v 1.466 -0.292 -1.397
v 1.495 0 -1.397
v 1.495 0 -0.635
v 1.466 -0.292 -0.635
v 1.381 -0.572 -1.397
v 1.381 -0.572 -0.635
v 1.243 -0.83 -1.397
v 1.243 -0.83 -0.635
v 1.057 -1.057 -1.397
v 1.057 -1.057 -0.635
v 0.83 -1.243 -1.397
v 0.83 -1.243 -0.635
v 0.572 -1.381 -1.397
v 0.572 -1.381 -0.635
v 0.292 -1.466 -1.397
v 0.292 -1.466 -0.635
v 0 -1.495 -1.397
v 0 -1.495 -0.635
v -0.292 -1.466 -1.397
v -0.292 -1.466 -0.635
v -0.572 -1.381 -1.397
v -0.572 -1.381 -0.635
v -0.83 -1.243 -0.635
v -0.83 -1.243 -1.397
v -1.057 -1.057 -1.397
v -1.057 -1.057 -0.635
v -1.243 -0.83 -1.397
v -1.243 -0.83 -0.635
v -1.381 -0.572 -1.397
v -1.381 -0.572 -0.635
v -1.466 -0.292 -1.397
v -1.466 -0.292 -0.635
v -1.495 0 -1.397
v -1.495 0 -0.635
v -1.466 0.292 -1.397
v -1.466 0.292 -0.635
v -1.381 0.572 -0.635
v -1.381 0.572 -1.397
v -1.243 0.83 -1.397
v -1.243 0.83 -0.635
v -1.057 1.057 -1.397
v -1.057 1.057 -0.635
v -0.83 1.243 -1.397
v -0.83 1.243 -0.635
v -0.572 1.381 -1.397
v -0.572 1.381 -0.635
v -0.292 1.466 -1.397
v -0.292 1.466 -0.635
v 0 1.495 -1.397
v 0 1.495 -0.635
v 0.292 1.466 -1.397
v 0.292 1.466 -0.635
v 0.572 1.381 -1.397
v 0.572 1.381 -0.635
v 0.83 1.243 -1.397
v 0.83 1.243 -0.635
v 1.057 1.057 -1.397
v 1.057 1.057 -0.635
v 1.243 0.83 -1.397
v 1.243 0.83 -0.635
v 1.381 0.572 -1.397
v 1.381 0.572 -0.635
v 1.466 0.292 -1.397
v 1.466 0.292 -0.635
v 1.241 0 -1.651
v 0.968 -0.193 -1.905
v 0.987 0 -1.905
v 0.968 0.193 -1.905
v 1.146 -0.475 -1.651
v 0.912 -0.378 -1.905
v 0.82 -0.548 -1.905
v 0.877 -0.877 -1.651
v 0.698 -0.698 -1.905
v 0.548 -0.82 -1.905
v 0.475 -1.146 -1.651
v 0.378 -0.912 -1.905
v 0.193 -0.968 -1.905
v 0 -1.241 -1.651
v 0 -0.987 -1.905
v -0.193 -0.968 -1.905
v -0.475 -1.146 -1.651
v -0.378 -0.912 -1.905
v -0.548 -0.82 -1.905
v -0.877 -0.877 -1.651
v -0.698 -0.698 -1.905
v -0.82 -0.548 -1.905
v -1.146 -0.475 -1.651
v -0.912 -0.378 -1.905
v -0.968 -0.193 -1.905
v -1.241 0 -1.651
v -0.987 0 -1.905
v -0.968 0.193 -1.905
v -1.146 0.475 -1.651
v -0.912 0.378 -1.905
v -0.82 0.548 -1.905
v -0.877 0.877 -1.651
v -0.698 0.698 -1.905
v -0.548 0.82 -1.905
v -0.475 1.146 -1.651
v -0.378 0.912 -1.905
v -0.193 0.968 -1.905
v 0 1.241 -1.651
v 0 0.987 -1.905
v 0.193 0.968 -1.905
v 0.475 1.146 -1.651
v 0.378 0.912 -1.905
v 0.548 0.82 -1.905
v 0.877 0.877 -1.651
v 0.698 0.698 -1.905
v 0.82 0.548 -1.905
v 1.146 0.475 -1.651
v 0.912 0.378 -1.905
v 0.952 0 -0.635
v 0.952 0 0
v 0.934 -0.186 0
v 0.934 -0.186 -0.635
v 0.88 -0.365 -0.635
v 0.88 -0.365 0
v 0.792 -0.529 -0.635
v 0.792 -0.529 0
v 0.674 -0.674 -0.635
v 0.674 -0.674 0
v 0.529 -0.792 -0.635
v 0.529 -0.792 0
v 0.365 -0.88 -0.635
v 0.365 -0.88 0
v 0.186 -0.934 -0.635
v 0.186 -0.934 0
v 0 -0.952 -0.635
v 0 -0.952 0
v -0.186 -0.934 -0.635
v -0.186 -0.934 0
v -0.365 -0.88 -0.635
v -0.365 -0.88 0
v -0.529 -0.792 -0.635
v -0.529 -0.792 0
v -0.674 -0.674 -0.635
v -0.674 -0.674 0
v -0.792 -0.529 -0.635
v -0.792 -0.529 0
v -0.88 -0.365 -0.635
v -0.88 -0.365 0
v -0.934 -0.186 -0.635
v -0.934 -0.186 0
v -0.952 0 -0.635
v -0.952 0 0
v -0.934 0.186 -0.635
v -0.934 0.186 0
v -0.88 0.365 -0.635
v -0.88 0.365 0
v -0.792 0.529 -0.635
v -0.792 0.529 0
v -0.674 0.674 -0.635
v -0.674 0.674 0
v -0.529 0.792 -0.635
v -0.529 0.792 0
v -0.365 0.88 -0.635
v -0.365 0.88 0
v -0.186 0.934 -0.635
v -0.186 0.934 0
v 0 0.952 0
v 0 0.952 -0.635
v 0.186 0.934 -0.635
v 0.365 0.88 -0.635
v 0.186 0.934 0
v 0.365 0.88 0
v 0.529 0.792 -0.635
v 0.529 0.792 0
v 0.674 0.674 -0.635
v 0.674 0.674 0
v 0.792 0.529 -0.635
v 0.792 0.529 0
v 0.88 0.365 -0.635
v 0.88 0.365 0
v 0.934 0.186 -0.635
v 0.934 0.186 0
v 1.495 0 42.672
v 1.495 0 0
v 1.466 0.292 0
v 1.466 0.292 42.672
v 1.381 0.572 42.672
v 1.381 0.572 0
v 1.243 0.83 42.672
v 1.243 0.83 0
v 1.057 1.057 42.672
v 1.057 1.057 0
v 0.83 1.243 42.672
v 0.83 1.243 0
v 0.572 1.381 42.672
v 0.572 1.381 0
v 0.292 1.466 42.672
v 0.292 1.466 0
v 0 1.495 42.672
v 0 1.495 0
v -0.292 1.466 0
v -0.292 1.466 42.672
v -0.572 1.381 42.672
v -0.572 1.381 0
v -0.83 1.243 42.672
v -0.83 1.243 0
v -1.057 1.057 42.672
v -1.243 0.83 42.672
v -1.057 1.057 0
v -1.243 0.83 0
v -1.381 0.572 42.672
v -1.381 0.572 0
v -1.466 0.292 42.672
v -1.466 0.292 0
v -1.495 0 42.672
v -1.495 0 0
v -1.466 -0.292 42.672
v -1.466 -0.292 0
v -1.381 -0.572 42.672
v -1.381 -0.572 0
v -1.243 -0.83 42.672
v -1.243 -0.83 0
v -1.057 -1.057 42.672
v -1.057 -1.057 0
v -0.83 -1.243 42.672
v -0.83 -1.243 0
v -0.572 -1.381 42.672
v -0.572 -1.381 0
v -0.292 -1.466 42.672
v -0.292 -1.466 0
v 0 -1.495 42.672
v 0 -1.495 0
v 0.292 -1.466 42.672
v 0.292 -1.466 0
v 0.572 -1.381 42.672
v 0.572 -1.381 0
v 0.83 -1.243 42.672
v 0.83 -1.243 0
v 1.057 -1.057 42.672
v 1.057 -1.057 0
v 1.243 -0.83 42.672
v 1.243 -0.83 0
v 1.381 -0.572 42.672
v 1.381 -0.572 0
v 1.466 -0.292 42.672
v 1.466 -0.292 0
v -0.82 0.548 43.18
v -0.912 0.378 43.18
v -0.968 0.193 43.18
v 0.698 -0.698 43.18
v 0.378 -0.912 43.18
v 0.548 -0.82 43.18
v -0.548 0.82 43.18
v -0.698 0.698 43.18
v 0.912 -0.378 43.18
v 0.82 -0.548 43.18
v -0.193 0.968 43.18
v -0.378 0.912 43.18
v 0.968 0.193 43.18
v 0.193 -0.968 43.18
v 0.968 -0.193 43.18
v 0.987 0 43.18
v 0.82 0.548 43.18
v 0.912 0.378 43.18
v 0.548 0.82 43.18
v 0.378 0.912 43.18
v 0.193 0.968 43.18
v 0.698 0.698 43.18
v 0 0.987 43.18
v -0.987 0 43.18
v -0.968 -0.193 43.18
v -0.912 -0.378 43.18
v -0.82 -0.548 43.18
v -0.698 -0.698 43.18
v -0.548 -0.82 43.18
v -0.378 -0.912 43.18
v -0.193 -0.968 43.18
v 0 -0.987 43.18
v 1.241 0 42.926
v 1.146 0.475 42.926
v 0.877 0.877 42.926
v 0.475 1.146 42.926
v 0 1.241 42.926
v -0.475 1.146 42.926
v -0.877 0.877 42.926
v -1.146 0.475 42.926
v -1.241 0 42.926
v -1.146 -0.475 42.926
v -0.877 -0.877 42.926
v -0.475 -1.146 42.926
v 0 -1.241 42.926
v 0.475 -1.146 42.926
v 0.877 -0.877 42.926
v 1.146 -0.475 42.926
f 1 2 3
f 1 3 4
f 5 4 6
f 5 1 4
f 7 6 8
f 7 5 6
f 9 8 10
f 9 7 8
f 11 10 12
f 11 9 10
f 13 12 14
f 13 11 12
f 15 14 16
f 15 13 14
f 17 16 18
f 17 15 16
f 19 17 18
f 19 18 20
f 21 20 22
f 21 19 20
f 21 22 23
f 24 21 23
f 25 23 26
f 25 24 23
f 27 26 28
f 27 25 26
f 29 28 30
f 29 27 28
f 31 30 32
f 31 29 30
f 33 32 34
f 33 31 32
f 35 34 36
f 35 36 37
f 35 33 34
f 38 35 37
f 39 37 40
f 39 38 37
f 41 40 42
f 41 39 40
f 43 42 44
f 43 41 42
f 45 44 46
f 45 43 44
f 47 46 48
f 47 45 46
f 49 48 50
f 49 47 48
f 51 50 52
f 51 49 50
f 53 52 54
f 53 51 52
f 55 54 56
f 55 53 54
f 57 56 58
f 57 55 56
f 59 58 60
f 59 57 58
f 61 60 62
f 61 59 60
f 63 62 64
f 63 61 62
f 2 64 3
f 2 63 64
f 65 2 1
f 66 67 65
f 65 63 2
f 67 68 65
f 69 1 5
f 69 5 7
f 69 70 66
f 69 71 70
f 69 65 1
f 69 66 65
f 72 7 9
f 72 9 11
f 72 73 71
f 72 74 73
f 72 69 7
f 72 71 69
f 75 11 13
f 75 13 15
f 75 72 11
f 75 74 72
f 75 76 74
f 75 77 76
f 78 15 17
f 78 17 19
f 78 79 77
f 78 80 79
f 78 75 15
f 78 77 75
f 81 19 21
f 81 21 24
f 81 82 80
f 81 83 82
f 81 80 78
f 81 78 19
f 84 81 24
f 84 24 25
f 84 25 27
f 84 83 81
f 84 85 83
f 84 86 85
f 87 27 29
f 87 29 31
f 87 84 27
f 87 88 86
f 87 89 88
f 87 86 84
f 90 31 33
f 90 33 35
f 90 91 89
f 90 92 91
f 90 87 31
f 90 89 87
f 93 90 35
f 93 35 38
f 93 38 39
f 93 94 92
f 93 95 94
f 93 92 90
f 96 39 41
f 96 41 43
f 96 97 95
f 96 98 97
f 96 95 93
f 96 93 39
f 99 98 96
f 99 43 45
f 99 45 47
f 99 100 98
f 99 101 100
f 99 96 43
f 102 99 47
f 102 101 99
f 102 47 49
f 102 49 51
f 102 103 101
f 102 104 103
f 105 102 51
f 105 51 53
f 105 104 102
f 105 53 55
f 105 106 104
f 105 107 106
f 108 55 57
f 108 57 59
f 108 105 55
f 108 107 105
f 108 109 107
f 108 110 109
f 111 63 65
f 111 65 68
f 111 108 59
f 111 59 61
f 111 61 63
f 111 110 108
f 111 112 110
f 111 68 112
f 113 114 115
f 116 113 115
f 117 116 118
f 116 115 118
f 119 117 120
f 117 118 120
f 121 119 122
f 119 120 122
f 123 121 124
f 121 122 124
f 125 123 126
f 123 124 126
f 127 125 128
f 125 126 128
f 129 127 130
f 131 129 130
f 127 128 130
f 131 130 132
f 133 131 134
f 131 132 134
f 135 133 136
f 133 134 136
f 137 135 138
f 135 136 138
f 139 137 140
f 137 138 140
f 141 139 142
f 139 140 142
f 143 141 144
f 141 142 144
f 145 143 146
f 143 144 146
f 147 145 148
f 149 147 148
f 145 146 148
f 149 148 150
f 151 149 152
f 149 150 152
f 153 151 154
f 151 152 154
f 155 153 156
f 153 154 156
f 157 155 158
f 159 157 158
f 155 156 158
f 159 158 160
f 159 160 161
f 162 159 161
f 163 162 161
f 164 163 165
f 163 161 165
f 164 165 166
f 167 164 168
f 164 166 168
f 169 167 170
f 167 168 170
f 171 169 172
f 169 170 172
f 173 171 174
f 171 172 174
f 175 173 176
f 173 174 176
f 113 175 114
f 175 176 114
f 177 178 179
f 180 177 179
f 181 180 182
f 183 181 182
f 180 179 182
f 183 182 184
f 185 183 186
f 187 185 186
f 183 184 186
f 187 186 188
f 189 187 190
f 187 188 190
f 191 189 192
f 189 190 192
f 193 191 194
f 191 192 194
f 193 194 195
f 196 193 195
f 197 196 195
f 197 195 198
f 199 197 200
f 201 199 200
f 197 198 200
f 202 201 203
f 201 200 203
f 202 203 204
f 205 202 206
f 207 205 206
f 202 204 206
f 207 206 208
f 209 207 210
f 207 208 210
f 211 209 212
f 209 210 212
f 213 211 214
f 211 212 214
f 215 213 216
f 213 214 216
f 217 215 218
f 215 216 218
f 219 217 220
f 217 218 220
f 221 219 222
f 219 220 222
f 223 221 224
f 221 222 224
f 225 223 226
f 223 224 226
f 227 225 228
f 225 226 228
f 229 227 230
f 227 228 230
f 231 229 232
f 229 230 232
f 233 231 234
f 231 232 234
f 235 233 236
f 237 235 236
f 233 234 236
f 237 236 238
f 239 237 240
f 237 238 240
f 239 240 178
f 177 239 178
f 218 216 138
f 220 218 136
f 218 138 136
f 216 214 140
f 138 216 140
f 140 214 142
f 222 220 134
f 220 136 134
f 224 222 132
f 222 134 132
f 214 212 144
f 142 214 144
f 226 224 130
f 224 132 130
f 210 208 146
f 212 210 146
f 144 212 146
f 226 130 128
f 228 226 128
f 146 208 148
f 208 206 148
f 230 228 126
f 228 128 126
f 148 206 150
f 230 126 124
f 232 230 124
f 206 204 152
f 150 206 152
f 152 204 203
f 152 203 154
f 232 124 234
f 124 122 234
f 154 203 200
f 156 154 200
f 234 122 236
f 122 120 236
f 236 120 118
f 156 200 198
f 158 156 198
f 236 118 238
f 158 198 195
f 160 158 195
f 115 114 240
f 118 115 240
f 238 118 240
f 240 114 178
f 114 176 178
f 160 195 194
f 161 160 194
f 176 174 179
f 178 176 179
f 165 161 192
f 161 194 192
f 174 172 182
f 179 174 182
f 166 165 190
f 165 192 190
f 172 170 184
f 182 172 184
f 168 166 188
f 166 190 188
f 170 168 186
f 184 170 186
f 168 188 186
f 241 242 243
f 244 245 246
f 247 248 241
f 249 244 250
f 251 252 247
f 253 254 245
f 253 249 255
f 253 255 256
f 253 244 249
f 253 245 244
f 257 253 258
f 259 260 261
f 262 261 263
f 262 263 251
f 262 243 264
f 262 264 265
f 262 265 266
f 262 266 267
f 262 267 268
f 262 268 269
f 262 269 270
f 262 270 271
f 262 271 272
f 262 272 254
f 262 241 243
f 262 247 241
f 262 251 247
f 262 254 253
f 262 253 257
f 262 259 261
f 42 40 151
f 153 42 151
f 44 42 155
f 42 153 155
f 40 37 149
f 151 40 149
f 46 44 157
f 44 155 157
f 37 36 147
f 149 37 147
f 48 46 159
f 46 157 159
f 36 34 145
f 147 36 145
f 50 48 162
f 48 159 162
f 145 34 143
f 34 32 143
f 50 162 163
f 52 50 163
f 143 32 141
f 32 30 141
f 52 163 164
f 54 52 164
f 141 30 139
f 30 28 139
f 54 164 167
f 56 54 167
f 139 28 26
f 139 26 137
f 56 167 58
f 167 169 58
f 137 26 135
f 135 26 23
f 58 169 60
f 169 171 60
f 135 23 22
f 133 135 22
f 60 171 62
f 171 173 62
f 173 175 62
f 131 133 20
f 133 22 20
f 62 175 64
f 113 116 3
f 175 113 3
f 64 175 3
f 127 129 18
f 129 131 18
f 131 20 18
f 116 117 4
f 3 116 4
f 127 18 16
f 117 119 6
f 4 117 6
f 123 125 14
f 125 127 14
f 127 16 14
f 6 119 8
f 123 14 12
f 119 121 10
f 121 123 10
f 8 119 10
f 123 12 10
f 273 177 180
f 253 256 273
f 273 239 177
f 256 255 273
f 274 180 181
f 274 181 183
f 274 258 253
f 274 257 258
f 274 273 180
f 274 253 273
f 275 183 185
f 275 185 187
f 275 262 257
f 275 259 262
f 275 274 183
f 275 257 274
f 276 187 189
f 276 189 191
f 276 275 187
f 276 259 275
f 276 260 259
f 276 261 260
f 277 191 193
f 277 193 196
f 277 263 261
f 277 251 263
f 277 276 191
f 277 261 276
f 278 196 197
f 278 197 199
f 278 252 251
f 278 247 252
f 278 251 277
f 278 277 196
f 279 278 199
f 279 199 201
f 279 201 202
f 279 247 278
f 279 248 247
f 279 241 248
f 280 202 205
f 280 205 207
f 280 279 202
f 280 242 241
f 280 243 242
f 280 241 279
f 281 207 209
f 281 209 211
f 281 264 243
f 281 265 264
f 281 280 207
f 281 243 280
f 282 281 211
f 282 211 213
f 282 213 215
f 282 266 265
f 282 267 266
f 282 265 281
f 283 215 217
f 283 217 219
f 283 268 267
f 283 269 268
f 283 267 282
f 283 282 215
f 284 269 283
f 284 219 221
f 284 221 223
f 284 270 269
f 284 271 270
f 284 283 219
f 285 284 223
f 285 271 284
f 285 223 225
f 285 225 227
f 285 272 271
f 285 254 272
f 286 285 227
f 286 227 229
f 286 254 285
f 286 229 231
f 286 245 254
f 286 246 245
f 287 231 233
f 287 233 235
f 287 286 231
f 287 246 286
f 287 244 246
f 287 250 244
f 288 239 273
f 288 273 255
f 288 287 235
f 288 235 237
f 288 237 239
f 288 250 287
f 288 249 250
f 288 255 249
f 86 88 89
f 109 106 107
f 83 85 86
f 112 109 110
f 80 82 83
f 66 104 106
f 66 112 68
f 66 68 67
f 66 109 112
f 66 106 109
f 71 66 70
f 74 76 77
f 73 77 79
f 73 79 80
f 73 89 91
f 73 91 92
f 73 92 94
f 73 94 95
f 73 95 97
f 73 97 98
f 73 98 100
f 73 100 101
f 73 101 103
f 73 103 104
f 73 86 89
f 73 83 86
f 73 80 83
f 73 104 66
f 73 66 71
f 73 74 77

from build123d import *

# Parameters (mm, degrees)
SKETCH1_R      = 1.49479
EXTRUDE1_DEPTH = 43.18
SKETCH2_R      = 0.9525
EXTRUDE2_DEPTH = 0.635
EXTRUDE3_START = 1.27
SKETCH3_R      = 1.49479
EXTRUDE3_DEPTH = 1.27
CHAMFER1_SIZE  = 0.508


with BuildPart() as part:
    # Sketch1 → Extrude1 (new body)
    with BuildSketch(Plane.XY):
        Circle(SKETCH1_R)
    extrude(amount=EXTRUDE1_DEPTH)

    # Sketch2 → Extrude2 (add)
    with BuildSketch(Plane(origin=(0, 0, 0), x_dir=(-1, 0, 0), z_dir=(0, 0, -1))):
        with Locations(Location((0, 0, 0), (0, 0, 180))):
            Circle(SKETCH2_R)
    extrude(amount=EXTRUDE2_DEPTH)

    # Sketch3 → Extrude3 (add)
    with BuildSketch(Plane(origin=(0, 0, -0.635), x_dir=(-1, 0, 0), z_dir=(0, 0, -1)).offset(EXTRUDE3_START)):
        with Locations(Location((0, 0, 0), (0, 0, 180))):
            Circle(SKETCH3_R)
    extrude(amount=-EXTRUDE3_DEPTH)

    # Chamfer1
    chamfer1_edges = [part.edges().sort_by_distance(p)[0] for p in [
        (-1.49479, 0, -1.905),
        (-1.49479, 0, 43.18),
    ]]
    chamfer(chamfer1_edges, length=CHAMFER1_SIZE)


solid = part.part
